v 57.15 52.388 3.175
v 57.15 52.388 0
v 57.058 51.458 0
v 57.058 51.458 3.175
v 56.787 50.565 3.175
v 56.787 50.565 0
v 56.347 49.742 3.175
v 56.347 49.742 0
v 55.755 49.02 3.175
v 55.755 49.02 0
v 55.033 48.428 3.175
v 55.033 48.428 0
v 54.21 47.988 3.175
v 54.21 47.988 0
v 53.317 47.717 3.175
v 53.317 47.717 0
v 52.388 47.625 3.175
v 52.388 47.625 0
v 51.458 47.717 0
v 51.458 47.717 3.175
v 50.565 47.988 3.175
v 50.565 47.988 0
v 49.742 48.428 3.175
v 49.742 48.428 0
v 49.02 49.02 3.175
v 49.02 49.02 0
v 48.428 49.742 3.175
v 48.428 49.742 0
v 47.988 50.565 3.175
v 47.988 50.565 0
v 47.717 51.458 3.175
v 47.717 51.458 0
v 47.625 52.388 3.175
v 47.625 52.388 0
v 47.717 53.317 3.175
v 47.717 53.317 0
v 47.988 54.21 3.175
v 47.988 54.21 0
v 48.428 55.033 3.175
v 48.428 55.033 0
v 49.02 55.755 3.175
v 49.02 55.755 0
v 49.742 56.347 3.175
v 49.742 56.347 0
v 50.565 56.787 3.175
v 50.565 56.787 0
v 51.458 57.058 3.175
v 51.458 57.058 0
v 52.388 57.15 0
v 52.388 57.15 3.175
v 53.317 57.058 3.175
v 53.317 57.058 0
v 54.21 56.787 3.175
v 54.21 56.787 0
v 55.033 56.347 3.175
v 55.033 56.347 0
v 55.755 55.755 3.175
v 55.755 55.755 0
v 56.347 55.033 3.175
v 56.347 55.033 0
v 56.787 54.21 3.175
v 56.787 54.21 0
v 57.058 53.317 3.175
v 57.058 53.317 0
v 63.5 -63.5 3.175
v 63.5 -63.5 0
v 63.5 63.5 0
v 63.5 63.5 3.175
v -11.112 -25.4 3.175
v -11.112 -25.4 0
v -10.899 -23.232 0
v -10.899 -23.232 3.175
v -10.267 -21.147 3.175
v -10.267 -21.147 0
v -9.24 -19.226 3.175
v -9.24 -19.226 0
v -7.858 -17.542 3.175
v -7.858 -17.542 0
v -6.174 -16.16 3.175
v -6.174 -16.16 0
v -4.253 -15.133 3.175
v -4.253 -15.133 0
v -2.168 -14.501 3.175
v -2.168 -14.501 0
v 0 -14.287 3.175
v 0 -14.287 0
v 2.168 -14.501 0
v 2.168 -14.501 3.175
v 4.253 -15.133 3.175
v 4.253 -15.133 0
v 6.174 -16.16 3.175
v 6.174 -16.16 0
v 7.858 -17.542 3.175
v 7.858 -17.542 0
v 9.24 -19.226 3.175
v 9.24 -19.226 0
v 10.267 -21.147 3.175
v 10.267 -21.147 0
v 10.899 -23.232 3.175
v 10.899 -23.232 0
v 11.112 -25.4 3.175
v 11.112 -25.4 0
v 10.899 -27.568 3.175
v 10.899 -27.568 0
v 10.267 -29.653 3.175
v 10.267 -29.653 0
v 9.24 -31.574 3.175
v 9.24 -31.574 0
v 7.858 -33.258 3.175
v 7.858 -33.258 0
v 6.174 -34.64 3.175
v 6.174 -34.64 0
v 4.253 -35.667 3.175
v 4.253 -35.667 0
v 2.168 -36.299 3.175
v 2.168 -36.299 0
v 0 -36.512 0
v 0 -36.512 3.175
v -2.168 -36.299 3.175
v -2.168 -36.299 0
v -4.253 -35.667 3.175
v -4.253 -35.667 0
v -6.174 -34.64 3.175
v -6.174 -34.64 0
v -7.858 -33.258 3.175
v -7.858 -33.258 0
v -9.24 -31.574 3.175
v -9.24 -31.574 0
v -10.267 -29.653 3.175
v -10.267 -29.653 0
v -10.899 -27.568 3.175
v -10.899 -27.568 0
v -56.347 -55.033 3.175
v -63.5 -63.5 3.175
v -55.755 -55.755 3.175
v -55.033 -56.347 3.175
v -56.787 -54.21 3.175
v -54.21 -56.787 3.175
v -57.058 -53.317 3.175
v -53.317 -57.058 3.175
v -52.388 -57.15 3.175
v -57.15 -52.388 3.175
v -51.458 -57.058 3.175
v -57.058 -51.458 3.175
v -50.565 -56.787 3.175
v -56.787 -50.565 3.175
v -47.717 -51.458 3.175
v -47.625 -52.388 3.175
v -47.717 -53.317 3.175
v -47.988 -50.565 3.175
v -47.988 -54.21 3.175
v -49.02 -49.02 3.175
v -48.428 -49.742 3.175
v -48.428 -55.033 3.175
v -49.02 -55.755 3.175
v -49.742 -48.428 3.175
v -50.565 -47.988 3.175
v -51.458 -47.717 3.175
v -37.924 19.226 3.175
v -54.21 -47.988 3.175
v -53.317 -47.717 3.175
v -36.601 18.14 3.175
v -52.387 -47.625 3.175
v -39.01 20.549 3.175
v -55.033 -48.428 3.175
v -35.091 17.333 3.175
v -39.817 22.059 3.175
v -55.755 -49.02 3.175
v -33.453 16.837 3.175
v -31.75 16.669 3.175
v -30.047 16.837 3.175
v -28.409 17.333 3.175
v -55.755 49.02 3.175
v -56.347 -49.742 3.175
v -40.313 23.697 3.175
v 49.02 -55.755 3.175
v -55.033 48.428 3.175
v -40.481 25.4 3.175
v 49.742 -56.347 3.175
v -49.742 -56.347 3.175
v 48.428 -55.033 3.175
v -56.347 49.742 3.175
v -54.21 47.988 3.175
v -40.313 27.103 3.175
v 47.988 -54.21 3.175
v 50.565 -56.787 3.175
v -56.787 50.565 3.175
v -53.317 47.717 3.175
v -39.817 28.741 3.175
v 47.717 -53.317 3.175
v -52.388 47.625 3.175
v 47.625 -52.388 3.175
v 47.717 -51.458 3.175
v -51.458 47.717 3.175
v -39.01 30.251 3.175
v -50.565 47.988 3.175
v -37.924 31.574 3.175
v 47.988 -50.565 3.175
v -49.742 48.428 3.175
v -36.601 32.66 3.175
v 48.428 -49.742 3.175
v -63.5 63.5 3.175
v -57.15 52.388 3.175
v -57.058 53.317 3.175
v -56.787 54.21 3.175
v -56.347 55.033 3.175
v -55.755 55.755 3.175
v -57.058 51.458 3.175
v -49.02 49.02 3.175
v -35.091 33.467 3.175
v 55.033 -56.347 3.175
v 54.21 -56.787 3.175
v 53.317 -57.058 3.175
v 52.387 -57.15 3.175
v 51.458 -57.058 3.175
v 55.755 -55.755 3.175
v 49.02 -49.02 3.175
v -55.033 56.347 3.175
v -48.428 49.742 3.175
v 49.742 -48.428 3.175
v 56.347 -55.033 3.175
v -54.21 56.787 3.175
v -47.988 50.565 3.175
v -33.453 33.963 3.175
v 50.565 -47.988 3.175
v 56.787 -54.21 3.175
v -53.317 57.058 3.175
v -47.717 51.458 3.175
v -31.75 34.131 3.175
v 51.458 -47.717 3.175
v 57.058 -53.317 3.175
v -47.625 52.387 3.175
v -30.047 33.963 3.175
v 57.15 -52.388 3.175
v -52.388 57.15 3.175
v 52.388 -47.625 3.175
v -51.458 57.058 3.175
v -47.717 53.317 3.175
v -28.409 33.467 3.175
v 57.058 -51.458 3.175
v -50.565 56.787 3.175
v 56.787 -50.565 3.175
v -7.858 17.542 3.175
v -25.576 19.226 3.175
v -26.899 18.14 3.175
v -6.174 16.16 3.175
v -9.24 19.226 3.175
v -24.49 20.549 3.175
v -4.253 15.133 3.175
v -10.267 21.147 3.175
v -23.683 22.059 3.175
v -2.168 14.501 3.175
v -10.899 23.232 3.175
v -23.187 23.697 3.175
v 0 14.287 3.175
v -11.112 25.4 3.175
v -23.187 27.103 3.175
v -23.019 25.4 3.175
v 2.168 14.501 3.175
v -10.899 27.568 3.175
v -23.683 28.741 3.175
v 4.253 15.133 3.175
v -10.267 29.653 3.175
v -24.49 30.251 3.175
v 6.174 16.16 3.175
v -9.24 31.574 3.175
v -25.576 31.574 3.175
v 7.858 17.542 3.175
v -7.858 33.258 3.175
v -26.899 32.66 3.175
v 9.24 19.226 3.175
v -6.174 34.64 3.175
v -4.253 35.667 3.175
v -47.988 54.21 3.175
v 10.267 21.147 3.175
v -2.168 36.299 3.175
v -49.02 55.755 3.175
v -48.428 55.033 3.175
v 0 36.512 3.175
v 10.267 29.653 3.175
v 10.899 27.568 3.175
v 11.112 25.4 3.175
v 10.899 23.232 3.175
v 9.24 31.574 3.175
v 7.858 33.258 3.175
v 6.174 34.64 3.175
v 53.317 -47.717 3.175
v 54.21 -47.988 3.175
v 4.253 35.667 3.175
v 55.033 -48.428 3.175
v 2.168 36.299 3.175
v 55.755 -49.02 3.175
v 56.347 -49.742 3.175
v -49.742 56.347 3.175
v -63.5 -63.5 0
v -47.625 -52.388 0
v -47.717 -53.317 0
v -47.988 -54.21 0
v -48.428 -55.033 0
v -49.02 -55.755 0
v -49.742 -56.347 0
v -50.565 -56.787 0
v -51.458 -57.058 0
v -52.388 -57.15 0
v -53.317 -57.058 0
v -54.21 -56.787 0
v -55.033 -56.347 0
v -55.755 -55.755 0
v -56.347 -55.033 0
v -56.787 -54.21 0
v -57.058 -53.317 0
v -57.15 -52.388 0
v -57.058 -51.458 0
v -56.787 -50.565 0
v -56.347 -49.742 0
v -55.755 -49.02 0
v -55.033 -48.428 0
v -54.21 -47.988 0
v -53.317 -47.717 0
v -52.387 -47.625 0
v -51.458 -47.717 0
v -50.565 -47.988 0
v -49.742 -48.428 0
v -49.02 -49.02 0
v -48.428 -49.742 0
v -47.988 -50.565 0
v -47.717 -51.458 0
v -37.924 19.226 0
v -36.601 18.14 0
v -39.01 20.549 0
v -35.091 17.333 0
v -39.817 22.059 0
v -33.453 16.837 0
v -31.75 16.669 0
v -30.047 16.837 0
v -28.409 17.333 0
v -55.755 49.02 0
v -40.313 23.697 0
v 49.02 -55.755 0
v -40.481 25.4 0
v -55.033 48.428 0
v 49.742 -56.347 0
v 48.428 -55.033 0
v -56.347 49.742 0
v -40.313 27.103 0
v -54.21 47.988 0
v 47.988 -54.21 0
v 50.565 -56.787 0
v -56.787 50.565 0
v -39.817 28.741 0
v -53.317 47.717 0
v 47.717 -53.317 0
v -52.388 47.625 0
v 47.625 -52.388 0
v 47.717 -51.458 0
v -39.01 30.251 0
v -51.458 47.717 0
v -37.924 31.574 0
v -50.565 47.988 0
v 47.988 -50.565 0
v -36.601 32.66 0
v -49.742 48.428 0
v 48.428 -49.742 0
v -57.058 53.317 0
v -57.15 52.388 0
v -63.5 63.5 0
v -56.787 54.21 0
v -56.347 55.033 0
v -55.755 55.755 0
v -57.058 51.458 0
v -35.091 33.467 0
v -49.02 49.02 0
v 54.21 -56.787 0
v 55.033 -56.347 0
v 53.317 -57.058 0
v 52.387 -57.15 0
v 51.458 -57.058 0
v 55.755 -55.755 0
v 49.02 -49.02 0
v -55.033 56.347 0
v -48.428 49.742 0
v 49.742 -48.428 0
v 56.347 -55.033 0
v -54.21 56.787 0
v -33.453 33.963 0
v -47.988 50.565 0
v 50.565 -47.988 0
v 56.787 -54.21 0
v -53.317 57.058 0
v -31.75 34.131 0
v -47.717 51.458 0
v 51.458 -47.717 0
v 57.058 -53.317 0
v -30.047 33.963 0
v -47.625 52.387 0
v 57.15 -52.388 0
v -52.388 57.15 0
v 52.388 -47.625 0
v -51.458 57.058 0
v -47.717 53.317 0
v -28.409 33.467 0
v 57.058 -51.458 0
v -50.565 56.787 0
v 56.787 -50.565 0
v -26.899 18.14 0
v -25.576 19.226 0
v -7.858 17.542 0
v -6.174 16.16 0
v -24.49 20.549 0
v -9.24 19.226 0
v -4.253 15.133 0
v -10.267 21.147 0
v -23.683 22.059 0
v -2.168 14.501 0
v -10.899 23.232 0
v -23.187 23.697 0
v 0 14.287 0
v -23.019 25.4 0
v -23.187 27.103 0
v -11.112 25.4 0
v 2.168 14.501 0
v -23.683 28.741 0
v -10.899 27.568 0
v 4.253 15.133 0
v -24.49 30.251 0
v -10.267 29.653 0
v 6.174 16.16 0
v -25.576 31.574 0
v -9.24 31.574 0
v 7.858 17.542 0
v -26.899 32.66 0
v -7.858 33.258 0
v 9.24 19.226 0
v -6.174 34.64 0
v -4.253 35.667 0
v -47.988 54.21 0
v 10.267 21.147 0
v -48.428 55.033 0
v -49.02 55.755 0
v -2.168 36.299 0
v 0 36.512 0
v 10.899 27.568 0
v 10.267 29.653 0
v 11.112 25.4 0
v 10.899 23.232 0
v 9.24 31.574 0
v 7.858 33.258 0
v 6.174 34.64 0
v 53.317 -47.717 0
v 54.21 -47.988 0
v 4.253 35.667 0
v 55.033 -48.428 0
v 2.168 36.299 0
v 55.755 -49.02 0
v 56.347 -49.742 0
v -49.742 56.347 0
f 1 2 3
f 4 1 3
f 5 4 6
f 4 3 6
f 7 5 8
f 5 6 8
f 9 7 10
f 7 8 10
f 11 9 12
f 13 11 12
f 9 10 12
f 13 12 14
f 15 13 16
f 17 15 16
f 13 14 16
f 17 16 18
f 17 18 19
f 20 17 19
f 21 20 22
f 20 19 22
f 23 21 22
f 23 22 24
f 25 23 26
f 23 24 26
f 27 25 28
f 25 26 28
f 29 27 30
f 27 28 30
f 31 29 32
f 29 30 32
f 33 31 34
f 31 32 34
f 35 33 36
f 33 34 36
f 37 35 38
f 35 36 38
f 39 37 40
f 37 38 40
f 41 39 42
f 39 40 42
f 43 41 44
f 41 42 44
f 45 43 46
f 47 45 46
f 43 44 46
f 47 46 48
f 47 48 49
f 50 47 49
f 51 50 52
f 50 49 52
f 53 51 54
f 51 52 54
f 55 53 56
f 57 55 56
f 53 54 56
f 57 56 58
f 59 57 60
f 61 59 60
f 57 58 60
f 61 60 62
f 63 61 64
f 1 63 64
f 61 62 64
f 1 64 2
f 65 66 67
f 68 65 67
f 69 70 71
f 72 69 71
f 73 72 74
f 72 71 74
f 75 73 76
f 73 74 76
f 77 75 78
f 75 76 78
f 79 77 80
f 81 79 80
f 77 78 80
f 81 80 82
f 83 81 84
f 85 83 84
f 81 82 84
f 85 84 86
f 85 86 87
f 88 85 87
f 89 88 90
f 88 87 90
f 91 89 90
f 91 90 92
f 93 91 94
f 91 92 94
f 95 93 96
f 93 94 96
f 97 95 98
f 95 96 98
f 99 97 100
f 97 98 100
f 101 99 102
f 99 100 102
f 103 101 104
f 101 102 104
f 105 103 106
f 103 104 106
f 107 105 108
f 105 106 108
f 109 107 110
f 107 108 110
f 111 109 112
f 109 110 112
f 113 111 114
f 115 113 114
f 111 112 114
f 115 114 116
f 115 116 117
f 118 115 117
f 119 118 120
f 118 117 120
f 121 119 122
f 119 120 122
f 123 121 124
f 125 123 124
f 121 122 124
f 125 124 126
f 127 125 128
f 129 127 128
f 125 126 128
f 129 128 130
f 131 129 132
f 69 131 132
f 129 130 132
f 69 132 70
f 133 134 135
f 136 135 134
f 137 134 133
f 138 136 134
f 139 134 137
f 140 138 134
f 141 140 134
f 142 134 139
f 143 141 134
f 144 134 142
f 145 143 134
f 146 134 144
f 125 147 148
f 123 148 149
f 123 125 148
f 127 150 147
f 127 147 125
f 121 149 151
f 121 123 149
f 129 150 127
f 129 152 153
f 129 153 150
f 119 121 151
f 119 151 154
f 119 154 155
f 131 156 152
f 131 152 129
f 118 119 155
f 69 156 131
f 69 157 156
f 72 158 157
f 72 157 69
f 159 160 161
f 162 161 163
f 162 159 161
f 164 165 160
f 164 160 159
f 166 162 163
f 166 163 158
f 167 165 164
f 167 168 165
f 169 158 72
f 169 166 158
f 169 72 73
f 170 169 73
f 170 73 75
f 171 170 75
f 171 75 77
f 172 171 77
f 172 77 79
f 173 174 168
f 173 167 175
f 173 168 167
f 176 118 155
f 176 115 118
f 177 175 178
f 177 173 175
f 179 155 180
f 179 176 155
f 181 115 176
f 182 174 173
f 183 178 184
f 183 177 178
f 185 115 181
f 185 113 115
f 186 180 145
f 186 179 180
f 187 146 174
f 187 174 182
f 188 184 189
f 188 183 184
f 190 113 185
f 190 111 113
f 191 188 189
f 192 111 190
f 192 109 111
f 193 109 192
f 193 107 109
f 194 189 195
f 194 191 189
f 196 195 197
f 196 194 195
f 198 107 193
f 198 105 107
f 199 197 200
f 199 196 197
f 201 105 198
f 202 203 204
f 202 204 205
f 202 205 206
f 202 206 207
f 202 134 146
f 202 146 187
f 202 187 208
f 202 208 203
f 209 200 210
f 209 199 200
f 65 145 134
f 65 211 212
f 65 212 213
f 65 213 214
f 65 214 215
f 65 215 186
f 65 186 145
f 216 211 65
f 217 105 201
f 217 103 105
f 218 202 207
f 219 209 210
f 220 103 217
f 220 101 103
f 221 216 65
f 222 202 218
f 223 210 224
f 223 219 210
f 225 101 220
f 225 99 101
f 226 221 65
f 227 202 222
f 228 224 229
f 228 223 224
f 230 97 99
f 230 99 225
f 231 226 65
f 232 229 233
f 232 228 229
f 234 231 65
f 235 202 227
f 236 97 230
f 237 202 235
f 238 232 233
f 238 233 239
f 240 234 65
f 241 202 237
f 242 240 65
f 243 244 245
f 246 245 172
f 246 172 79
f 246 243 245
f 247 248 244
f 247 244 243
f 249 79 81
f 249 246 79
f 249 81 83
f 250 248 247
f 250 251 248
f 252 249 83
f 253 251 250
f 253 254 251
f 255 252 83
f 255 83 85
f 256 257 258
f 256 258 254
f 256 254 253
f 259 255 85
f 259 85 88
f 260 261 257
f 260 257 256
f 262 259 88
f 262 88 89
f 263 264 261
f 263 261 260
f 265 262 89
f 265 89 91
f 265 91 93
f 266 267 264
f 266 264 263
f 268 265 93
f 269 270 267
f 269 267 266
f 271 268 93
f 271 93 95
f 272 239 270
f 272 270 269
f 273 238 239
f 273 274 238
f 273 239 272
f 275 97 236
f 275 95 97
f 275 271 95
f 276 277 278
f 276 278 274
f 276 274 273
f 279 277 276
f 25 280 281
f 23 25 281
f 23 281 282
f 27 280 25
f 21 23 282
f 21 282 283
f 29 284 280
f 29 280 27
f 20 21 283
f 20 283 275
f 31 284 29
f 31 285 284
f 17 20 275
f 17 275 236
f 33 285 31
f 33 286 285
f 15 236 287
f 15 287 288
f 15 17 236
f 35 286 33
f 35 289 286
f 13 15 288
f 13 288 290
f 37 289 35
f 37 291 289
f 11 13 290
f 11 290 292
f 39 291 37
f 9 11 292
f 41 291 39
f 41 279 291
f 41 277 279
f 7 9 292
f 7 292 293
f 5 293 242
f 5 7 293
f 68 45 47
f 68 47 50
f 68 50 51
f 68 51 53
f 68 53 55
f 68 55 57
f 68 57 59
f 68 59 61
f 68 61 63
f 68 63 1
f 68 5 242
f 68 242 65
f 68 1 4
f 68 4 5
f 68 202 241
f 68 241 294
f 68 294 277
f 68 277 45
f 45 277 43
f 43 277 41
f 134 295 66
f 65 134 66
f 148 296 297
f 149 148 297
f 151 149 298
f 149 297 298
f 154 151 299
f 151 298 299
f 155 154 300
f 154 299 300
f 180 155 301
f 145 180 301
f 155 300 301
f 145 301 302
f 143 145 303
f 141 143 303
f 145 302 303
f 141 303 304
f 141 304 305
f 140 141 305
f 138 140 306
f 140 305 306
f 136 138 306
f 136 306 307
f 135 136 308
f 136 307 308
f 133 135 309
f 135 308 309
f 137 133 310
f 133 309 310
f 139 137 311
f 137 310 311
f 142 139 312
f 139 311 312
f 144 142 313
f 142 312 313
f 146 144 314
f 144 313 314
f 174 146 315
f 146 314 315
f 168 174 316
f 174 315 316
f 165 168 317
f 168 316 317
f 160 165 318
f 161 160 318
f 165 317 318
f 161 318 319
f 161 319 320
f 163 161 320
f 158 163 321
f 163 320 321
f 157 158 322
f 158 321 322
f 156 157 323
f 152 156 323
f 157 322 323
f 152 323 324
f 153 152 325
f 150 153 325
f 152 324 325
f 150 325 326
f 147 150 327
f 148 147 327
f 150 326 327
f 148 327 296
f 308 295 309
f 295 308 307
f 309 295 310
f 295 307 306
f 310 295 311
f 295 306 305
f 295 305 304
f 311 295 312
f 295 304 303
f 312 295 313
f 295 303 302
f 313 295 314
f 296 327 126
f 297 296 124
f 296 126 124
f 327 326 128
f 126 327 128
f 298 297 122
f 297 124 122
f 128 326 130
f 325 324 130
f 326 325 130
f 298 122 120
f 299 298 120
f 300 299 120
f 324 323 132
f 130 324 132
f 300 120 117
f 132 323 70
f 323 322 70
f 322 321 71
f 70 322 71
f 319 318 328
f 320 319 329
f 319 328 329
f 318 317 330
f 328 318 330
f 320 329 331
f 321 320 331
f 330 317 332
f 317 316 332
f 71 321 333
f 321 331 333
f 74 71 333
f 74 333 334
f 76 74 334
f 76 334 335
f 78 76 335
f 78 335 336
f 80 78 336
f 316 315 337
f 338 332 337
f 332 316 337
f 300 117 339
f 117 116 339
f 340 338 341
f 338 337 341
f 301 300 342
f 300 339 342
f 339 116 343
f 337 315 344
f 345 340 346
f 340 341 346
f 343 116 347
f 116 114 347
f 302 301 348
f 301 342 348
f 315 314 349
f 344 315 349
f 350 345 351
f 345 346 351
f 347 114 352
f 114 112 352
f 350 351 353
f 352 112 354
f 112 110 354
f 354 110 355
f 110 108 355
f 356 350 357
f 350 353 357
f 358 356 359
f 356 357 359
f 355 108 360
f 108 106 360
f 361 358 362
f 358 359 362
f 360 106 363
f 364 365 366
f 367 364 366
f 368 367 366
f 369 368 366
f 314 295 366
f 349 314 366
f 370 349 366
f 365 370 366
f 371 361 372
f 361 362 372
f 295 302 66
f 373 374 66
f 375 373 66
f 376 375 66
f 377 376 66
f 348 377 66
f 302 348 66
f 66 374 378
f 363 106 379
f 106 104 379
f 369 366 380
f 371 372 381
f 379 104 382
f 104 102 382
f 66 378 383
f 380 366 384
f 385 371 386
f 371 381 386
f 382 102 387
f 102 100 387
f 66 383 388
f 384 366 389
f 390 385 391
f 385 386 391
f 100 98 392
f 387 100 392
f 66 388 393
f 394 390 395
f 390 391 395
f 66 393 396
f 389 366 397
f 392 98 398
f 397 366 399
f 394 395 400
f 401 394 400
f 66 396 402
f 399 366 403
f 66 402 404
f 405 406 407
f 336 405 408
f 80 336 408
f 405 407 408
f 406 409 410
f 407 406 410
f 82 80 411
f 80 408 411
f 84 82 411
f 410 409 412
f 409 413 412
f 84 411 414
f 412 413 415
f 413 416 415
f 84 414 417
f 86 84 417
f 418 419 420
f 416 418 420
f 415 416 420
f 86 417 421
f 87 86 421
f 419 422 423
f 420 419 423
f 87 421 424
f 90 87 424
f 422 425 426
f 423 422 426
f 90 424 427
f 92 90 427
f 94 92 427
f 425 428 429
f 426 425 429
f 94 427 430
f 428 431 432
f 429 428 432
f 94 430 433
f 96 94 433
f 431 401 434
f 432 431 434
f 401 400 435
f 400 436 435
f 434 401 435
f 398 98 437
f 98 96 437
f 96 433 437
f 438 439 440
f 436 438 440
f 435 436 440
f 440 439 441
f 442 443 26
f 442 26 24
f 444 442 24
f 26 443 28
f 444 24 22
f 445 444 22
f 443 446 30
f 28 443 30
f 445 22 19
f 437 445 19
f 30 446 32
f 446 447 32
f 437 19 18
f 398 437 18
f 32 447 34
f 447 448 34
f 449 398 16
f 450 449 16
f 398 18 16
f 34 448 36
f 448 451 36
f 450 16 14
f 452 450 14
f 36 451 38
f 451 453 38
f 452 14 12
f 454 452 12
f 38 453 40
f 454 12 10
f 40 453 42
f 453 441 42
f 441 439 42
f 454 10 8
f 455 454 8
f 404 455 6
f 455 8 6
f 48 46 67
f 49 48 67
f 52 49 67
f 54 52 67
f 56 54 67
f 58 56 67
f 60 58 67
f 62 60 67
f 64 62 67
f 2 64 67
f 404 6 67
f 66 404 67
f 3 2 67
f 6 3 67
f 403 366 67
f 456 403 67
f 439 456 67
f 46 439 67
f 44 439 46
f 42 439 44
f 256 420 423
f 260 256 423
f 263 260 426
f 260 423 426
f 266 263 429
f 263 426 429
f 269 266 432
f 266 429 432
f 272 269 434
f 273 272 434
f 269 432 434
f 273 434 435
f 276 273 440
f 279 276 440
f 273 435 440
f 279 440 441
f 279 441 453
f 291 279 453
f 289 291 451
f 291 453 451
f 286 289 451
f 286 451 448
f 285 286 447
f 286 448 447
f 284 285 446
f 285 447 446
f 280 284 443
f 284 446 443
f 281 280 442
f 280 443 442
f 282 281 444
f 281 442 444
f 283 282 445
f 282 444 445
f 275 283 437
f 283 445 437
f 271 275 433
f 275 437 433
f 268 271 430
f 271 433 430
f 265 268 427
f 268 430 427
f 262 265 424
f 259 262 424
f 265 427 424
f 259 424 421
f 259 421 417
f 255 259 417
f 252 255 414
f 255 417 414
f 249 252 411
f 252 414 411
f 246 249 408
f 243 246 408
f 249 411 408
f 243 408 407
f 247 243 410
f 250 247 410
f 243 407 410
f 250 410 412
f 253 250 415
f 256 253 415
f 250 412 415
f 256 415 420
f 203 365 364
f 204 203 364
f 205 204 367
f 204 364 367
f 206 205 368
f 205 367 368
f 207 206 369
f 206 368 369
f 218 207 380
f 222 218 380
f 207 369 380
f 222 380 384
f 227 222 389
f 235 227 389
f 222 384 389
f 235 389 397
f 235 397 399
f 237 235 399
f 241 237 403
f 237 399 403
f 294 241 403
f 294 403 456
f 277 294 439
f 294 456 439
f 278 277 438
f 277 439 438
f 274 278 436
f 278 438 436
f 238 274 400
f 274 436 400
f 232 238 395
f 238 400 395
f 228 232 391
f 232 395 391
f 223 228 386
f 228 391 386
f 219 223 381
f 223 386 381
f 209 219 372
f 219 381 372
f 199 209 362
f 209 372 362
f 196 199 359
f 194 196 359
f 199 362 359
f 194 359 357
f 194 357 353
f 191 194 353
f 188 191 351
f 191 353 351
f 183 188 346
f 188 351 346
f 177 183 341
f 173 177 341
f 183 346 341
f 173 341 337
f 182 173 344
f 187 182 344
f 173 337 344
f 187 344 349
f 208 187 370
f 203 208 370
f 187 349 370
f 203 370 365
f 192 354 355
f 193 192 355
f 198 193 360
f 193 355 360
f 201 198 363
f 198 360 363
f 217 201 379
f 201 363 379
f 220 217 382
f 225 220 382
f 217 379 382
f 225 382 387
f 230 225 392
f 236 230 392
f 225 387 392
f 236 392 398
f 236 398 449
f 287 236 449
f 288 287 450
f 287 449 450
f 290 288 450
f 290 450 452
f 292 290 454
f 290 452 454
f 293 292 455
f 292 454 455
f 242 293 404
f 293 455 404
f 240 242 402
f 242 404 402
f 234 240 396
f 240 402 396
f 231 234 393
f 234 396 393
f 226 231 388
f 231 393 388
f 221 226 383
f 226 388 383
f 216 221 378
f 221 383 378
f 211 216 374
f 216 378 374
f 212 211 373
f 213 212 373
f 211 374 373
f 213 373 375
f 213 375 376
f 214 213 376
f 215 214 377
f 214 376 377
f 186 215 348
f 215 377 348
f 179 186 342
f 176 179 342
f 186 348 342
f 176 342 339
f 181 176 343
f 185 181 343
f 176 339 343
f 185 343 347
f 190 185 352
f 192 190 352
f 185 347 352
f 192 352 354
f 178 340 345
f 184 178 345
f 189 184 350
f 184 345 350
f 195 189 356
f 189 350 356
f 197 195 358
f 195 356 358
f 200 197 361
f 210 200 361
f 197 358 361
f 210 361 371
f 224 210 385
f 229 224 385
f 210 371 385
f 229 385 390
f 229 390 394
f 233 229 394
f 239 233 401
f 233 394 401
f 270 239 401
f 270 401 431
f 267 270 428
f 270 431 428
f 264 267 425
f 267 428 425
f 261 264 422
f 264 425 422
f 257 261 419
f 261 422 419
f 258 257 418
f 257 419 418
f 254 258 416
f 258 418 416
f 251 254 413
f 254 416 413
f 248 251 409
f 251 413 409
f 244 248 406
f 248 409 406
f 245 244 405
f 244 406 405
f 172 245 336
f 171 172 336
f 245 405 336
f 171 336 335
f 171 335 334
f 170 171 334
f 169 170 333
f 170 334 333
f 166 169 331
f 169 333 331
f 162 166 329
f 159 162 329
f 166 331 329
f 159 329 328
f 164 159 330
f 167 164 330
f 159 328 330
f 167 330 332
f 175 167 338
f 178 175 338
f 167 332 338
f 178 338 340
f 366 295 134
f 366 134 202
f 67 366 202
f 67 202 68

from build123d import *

# Parameters (mm, degrees)
SKETCH1_W           = 127
SKETCH1_H           = 127
BOSS_EXTRUDE1_DEPTH = 3.175
SKETCH2_R           = 11.1125
SKETCH2_R_2         = 8.73125
CUT_EXTRUDE1_DEPTH  = 3.175
SKETCH3_R           = 4.7625
CUT_EXTRUDE2_DEPTH  = 3.175


with BuildPart() as part:
    # Sketch1 → Boss-Extrude1 (new body)
    with BuildSketch(Plane.XY):
        Rectangle(SKETCH1_W, SKETCH1_H)
    extrude(amount=BOSS_EXTRUDE1_DEPTH)

    # Sketch2 → Cut-Extrude1 (cut)
    with BuildSketch(Plane(origin=(0, 0, 0), x_dir=(-1, 0, 0), z_dir=(0, 0, -1))):
        with Locations((0, 25.4)):
            Circle(SKETCH2_R)
        with Locations((31.75, 25.4)):
            Circle(SKETCH2_R_2)
        with Locations((0, -25.4)):
            Circle(SKETCH2_R)
    extrude(amount=-CUT_EXTRUDE1_DEPTH, mode=Mode.SUBTRACT)

    # Sketch3 → Cut-Extrude2 (cut)
    with BuildSketch(Plane(origin=(0, 0, 0), x_dir=(-1, 0, 0), z_dir=(0, 0, -1))):
        with Locations((52.3875, 52.3875)):
            Circle(SKETCH3_R)
        with Locations(Location((52.3875, -52.3875, 0), (0, 0, 180))):
            Circle(SKETCH3_R)
        with Locations(Location((-52.3875, 52.3875, 0), (0, 0, 180))):
            Circle(SKETCH3_R)
        with Locations((-52.3875, -52.3875)):
            Circle(SKETCH3_R)
    extrude(amount=-CUT_EXTRUDE2_DEPTH, mode=Mode.SUBTRACT)


solid = part.part
